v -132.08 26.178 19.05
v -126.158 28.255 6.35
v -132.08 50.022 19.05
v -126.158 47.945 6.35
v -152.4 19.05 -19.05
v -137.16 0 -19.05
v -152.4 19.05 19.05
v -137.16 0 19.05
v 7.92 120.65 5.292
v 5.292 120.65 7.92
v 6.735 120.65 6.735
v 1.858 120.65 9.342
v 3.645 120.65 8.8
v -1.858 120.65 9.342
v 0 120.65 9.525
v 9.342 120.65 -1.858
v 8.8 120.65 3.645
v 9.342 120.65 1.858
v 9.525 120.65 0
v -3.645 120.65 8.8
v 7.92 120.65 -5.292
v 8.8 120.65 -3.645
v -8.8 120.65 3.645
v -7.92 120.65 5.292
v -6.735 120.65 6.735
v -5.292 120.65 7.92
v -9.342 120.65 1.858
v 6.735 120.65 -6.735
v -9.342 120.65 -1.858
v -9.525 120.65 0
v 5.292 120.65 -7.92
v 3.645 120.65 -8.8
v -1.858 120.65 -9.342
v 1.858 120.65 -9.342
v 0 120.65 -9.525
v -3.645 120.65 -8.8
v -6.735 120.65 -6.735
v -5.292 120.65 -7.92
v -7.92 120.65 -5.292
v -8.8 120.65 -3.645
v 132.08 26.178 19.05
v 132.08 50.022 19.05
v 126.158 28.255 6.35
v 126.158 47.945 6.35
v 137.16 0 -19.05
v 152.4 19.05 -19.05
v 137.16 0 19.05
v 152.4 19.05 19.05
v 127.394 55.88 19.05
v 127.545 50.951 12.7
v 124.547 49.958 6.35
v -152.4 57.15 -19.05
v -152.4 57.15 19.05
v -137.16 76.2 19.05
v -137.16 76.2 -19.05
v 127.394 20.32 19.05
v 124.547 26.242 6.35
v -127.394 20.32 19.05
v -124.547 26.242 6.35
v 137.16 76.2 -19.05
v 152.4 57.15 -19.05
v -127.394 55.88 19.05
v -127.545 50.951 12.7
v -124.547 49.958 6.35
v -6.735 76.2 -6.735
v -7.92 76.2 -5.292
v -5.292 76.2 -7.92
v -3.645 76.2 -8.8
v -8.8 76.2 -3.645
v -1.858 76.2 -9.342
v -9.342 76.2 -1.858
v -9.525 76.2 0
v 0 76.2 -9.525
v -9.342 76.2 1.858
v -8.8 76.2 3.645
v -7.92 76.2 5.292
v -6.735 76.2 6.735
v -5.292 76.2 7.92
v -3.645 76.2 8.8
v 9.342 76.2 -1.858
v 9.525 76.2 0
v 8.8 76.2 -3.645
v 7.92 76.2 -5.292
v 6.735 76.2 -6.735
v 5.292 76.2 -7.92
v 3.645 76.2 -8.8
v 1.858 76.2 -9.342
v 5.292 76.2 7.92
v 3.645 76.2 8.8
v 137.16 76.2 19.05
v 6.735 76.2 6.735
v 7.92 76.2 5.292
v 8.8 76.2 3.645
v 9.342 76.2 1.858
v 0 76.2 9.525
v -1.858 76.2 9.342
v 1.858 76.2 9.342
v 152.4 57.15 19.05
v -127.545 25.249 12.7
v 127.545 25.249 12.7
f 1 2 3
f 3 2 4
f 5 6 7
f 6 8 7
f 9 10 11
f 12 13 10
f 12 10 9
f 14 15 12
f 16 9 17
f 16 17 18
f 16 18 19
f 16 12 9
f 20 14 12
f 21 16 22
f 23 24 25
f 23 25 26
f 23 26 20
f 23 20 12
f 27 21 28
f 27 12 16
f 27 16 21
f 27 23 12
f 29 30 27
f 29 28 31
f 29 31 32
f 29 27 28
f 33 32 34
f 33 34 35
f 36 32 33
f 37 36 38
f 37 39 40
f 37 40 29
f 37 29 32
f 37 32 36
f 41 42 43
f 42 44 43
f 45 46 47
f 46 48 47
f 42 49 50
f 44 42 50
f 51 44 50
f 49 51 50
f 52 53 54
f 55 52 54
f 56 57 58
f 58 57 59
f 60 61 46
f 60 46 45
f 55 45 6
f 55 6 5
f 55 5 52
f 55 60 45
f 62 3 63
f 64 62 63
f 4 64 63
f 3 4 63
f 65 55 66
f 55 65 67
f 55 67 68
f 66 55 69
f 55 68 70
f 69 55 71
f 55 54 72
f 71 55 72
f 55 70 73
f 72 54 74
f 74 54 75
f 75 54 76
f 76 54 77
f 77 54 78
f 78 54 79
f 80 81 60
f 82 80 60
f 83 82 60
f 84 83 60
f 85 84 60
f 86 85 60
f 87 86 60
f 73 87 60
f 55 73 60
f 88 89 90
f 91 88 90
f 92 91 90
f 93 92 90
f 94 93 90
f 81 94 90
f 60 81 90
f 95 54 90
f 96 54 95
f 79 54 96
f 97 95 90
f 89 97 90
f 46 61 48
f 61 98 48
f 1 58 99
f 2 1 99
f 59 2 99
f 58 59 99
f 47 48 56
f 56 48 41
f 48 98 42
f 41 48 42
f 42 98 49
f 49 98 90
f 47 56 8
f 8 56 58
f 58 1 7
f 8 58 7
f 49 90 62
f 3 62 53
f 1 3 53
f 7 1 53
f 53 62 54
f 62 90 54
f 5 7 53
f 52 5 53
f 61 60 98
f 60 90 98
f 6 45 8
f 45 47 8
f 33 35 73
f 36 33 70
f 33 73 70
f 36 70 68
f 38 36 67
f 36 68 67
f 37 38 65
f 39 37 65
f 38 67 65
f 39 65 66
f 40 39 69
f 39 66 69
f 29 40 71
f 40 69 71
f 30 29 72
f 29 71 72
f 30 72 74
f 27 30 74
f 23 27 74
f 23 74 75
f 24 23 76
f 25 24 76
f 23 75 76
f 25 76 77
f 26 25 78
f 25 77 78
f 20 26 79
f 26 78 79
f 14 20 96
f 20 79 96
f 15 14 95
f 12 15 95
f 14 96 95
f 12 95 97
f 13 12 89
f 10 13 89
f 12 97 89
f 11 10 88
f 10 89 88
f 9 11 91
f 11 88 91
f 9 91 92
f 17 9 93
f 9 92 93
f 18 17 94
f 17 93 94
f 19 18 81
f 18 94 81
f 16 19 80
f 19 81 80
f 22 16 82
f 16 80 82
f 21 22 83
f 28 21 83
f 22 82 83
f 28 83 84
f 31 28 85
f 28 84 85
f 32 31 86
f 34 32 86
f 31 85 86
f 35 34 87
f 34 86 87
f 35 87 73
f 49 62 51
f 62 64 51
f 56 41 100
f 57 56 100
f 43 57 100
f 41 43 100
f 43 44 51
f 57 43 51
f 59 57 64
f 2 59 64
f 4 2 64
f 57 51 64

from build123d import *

# Parameters (mm, degrees)
BOSS_EXTRUDE1_DEPTH = 19.05
CUT_EXTRUDE1_DEPTH  = 12.7
CUT_EXTRUDE1_TAPER  = 25
SKETCH9_R           = 9.525
BOSS_EXTRUDE3_DEPTH = 44.45


with BuildPart() as part:
    # Sketch2 → Boss-Extrude1 (new, symmetric)
    with BuildSketch(Plane.XY):
        Polygon((-137.16, 76.2), (137.16, 76.2), (152.4, 57.15), (152.4, 19.05), (137.16, 0), (-137.16, 0), (-152.4, 19.05), (-152.4, 57.15), align=None)
    extrude(amount=BOSS_EXTRUDE1_DEPTH, both=True)

    # 3DSketch1 → Cut-Extrude1 (cut)
    with BuildSketch(Plane(origin=(127.393703099, 20.32, 19.05), x_dir=(-0.9935119261035652, 0.11372797672509682, 0), z_dir=(0, 0, -1))):
        Polygon((0, 0), (253.134326679, -28.976456202), (258.45642237, -23.689554441), (261.16818156, 0), (257.178493531, 6.35282789), (4.044166852, 35.329284092), (-1.277928839, 30.042382332), (-3.989688029, 6.35282789), align=None)
    extrude(amount=CUT_EXTRUDE1_DEPTH, taper=CUT_EXTRUDE1_TAPER, mode=Mode.SUBTRACT)

    # Sketch9 → Boss-Extrude3 (add)
    with BuildSketch(Plane(origin=(0, 76.2, 0), x_dir=(1, 0, 0), z_dir=(0, 1, 0))):
        with Locations(Location((0, 0, 0), (0, 0, 90))):
            Circle(SKETCH9_R)
    extrude(amount=BOSS_EXTRUDE3_DEPTH)


solid = part.part
